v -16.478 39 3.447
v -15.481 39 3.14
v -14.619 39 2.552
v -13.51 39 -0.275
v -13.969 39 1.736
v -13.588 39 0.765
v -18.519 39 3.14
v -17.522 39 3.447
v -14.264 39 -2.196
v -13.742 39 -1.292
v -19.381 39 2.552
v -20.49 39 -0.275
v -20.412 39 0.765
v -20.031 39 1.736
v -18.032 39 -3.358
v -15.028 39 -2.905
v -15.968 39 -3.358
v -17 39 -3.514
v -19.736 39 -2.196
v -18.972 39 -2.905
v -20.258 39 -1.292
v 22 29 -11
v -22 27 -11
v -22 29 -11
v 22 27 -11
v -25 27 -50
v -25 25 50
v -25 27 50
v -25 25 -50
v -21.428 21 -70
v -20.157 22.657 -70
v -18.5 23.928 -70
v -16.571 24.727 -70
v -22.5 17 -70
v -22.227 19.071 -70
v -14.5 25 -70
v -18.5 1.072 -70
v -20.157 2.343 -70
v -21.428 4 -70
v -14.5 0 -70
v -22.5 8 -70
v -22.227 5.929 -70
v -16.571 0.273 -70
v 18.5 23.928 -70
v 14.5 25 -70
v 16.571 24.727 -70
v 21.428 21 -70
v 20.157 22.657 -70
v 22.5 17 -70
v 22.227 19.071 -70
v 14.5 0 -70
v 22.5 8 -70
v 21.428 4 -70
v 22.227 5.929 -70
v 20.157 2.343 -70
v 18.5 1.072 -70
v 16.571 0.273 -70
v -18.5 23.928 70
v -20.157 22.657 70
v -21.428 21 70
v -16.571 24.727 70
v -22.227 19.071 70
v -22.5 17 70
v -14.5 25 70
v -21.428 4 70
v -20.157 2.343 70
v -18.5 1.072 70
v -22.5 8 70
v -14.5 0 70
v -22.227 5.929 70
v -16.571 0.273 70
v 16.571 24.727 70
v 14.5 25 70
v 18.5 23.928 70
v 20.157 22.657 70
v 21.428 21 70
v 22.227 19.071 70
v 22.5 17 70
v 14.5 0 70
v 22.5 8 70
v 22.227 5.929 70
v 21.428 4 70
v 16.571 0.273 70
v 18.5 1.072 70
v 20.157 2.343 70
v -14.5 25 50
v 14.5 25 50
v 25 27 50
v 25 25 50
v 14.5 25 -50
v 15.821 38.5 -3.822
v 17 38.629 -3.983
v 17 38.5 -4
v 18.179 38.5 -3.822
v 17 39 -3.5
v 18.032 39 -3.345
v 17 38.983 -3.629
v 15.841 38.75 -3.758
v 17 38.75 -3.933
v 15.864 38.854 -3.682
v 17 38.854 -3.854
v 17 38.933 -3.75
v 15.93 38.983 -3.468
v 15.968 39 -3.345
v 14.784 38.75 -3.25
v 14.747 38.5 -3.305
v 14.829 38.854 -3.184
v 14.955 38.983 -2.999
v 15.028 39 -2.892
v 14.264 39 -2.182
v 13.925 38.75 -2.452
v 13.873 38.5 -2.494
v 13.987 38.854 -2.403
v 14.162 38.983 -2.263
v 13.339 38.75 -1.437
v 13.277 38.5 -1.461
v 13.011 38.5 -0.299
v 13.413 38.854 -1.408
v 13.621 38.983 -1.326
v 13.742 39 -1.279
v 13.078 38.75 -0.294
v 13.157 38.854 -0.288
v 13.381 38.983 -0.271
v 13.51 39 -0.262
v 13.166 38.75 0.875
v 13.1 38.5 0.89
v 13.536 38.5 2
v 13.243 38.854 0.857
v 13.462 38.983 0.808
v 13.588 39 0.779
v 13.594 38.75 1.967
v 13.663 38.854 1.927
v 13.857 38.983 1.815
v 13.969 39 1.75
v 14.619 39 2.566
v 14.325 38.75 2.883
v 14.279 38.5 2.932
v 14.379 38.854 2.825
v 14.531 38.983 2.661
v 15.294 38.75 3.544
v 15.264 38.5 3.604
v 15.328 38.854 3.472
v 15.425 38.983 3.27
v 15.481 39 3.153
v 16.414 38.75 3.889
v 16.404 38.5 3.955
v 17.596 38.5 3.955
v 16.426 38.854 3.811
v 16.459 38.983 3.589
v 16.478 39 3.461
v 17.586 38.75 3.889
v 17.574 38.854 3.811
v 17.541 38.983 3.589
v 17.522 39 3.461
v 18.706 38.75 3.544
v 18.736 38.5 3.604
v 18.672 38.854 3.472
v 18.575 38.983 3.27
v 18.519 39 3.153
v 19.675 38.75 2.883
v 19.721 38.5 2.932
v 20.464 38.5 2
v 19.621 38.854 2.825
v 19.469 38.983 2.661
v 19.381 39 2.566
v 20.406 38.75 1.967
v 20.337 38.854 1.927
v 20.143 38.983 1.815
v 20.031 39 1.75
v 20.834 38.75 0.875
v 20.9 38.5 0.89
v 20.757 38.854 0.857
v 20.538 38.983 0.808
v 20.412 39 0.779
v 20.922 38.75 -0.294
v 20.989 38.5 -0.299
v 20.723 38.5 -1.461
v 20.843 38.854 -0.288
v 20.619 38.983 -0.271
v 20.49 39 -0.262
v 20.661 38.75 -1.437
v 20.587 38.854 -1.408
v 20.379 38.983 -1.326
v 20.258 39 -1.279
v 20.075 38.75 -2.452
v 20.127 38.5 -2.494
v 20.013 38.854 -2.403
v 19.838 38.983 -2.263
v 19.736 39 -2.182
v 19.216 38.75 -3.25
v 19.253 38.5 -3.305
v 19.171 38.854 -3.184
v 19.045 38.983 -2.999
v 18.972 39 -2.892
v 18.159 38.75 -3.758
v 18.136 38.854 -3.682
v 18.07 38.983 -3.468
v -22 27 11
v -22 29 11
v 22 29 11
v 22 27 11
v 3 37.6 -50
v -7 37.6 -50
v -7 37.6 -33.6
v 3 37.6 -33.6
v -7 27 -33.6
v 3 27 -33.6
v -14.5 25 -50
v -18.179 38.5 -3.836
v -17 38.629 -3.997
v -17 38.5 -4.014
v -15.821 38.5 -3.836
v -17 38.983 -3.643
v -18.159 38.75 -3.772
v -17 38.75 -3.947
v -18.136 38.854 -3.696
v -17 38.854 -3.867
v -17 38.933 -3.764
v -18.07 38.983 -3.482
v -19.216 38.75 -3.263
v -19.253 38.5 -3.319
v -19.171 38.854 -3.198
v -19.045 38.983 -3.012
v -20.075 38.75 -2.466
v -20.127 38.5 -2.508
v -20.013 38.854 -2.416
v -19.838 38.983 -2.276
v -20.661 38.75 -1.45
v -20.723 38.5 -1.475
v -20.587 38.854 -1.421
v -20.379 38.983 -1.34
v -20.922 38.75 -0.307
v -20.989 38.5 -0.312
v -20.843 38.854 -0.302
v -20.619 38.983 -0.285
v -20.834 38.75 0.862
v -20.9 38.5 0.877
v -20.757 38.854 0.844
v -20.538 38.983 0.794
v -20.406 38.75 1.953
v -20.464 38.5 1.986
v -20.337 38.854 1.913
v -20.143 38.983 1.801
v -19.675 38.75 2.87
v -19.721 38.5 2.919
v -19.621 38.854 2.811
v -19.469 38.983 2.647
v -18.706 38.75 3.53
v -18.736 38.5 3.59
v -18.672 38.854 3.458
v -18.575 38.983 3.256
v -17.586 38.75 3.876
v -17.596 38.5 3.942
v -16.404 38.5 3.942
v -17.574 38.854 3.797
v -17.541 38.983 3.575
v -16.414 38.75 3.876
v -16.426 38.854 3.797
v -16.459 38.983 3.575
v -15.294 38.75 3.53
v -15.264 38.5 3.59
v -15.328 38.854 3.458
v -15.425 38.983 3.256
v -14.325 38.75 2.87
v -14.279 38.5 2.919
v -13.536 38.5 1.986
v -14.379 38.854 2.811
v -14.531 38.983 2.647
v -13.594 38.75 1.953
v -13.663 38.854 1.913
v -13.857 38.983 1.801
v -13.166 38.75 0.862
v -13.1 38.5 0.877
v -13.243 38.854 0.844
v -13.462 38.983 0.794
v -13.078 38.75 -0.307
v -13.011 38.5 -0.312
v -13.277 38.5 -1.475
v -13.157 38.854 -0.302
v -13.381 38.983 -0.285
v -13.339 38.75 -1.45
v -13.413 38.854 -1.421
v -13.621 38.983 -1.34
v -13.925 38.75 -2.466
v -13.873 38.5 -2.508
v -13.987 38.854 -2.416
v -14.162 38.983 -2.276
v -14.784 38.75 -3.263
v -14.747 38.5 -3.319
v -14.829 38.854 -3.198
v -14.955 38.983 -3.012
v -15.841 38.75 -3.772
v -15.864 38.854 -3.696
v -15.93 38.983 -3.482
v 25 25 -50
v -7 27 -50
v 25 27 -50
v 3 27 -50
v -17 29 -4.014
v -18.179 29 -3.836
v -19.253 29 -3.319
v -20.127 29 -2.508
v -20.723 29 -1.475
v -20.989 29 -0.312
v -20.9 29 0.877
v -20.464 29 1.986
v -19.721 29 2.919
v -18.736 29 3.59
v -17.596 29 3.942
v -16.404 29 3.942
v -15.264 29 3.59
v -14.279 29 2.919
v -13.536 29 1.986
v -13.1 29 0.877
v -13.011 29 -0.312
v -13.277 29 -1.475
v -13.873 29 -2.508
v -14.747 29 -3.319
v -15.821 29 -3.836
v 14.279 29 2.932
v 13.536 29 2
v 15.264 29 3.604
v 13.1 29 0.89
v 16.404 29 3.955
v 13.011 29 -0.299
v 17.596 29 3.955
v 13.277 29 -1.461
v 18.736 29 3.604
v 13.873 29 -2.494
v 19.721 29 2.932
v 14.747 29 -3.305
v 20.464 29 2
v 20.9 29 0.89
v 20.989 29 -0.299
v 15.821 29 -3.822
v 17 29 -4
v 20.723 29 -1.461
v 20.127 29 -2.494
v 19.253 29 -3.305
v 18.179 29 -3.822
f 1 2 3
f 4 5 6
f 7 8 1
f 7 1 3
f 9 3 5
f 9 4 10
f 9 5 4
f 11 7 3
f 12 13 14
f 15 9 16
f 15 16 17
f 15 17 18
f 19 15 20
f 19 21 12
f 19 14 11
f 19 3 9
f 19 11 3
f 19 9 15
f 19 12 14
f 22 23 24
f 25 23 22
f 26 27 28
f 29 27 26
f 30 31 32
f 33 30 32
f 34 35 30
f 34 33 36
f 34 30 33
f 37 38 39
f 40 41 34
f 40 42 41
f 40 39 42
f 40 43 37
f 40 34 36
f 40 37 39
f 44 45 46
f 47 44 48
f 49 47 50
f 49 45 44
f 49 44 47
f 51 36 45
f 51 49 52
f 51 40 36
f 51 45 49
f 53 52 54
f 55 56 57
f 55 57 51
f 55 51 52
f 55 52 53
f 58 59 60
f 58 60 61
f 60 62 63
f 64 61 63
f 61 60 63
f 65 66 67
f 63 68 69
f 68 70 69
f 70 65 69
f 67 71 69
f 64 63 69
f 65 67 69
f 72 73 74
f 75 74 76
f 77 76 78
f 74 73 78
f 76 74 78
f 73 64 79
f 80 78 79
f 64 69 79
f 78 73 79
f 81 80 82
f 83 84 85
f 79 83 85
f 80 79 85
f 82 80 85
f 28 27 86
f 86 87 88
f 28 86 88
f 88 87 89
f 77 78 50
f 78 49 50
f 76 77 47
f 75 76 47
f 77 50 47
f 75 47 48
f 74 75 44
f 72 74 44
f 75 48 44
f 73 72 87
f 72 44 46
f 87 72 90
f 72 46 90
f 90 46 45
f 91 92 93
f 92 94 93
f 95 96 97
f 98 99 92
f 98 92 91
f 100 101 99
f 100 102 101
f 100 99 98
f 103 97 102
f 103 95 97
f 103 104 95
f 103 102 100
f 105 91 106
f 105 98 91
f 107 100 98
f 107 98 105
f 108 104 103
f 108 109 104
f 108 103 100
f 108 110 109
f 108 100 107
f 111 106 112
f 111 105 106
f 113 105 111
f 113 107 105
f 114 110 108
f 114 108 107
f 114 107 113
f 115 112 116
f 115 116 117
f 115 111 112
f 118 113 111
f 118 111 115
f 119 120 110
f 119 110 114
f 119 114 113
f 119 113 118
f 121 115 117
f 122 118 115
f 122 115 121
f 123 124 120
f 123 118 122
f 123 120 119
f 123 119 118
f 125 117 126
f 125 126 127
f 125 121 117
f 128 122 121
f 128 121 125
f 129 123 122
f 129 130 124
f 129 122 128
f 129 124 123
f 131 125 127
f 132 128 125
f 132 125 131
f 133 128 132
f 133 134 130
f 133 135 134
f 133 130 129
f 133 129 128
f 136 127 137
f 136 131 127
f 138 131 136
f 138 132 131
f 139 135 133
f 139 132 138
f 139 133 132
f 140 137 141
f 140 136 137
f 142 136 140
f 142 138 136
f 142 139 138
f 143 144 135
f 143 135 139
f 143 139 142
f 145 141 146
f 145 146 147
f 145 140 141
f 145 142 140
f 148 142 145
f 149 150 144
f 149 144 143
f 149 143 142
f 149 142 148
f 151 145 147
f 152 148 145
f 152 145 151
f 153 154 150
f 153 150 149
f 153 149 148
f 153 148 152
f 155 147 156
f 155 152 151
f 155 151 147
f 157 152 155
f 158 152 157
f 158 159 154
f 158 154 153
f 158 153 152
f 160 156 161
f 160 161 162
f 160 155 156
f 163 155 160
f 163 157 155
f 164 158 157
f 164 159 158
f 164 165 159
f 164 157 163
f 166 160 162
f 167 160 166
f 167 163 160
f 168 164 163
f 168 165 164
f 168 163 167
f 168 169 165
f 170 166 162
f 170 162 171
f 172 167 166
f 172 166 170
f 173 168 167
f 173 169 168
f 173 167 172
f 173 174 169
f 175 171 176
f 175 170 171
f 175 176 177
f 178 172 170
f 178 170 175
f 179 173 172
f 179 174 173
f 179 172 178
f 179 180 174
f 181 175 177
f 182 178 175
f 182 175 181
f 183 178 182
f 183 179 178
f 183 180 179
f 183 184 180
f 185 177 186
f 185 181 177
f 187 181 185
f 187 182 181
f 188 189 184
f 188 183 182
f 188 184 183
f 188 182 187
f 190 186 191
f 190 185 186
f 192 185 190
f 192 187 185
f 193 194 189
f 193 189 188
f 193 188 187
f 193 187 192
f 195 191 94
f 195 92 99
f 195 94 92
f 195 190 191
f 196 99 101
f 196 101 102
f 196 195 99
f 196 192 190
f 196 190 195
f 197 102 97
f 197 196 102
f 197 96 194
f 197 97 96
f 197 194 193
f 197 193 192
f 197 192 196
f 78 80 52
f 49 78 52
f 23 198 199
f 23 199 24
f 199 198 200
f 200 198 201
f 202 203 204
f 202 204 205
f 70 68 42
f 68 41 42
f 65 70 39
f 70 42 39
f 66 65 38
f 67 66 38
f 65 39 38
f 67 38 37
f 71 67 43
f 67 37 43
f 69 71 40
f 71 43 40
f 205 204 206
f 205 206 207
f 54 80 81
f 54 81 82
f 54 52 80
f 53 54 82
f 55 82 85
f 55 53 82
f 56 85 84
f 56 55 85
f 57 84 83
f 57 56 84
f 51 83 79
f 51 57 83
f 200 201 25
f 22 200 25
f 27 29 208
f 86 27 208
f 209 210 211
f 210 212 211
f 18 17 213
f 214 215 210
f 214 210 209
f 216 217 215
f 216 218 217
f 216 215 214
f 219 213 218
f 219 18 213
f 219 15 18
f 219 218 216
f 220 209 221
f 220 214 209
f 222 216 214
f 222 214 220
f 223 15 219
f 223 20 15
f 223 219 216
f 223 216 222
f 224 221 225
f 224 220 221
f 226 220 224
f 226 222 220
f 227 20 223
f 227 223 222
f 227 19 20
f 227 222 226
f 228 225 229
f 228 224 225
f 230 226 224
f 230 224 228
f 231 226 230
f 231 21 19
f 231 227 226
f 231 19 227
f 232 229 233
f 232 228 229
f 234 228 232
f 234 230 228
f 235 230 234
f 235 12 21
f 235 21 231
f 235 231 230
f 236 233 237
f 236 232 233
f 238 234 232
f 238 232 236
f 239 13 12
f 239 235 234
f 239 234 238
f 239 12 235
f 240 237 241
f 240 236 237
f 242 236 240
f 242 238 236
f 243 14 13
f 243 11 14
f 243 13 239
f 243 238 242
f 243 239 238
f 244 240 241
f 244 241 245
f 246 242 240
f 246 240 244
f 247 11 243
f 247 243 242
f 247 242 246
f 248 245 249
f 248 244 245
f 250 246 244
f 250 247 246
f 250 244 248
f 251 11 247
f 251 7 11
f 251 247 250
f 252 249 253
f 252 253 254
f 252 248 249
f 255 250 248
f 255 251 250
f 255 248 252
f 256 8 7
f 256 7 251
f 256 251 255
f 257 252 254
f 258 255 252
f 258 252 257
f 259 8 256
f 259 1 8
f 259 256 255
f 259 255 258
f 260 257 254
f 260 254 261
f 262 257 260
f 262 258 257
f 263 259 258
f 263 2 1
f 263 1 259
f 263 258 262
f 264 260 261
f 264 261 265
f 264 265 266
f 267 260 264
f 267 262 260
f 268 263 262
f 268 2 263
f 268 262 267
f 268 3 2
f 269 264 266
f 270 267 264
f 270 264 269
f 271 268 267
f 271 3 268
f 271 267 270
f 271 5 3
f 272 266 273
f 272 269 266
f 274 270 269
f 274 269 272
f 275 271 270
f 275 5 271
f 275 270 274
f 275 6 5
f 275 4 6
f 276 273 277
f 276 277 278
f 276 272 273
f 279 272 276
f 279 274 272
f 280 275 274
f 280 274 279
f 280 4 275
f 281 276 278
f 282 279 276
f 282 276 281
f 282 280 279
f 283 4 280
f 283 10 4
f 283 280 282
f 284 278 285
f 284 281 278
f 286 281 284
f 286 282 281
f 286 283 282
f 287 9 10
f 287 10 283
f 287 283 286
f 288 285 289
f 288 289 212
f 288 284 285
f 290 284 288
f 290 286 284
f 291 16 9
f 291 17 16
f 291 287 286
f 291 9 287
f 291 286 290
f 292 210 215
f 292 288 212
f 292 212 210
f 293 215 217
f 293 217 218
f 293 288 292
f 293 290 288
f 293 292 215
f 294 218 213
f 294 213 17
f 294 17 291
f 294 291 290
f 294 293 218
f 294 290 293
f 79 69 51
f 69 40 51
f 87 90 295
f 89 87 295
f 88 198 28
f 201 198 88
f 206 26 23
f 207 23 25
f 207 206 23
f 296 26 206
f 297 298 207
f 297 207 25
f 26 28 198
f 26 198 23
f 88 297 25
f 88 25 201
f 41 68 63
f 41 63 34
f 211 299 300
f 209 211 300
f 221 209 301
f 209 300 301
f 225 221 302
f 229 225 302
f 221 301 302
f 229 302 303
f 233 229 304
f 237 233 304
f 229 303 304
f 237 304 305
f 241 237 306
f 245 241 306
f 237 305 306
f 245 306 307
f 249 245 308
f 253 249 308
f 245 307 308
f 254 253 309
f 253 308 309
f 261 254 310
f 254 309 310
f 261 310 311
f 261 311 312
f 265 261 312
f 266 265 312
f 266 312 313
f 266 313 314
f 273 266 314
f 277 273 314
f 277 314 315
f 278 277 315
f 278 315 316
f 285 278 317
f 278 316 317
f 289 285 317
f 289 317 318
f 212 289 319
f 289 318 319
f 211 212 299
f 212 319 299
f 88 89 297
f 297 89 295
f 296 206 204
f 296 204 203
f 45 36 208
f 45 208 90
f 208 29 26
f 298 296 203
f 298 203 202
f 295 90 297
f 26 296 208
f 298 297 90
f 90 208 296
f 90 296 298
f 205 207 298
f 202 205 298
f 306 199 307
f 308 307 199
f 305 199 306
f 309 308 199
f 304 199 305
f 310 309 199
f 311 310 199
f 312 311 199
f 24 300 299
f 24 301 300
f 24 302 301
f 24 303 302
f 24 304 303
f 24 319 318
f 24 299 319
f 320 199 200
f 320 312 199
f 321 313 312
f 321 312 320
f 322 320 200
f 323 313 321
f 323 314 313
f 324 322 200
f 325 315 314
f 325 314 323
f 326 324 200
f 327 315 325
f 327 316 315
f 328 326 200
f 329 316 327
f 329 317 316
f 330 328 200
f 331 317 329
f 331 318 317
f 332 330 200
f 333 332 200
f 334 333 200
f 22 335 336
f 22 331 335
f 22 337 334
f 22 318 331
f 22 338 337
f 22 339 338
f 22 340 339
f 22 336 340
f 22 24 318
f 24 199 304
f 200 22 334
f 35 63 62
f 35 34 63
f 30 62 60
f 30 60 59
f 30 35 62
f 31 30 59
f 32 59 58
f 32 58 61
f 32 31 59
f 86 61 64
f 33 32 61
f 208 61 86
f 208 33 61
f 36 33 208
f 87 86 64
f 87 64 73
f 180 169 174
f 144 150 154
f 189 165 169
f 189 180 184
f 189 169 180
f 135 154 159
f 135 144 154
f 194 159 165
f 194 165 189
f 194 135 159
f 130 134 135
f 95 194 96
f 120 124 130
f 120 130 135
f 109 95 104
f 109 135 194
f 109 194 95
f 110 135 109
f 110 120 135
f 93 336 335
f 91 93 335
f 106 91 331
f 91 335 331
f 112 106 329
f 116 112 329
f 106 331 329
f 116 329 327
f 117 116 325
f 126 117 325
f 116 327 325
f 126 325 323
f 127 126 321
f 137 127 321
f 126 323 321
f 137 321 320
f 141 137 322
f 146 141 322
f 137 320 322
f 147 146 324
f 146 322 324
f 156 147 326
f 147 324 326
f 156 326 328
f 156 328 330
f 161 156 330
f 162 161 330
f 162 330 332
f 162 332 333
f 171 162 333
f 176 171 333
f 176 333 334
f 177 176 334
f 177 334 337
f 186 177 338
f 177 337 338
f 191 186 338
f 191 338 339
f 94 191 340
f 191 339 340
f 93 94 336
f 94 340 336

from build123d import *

# Parameters (mm, degrees)
SKIZZE1_W                       = 45
SKIZZE1_H                       = 140
AUFSATZ_LINEAR_AUSTRAGEN1_DEPTH = 25
VERRUNDUNG1_R                   = 8
SKIZZE2_W                       = 50
SKIZZE2_H                       = 100
AUFSATZ_LINEAR_AUSTRAGEN2_DEPTH = 2
SKIZZE4_W                       = 10
SKIZZE4_H                       = 16.4
AUFSATZ_LINEAR_AUSTRAGEN3_DEPTH = 10.6
SKIZZE5_W                       = 44
SKIZZE5_H                       = 22
AUFSATZ_LINEAR_AUSTRAGEN4_DEPTH = 2
SKIZZE6_R                       = 4
AUFSATZ_LINEAR_AUSTRAGEN5_DEPTH = 10
VERRUNDUNG2_R                   = 0.5


with BuildPart() as part:
    # Skizze1 → Aufsatz-Linear austragen1 (new body)
    with BuildSketch(Plane(origin=(0, 0, 0), x_dir=(1, 0, 0), z_dir=(0, 1, 0))):
        Rectangle(SKIZZE1_W, SKIZZE1_H)
    extrude(amount=AUFSATZ_LINEAR_AUSTRAGEN1_DEPTH)

    # Verrundung1
    verrundung1_edges = [part.edges().sort_by_distance(p)[0] for p in [
        (-22.5, 25, 0),
        (22.5, 25, 0),
        (-22.5, 0, 0),
        (22.5, 0, 0),
    ]]
    fillet(verrundung1_edges, radius=VERRUNDUNG1_R)

    # Skizze2 → Aufsatz-Linear austragen2 (add)
    with BuildSketch(Plane(origin=(0, 25, 0), x_dir=(1, 0, 0), z_dir=(0, 1, 0))):
        Rectangle(SKIZZE2_W, SKIZZE2_H)
    extrude(amount=AUFSATZ_LINEAR_AUSTRAGEN2_DEPTH)

    # Skizze4 → Aufsatz-Linear austragen3 (add)
    with BuildSketch(Plane(origin=(0, 27, 0), x_dir=(1, 0, 0), z_dir=(0, 1, 0))):
        with Locations((-2, 41.8)):
            Rectangle(SKIZZE4_W, SKIZZE4_H)
    extrude(amount=AUFSATZ_LINEAR_AUSTRAGEN3_DEPTH)



with BuildPart() as body_2:
    # Skizze5 → Aufsatz-Linear austragen4 (new body)
    with BuildSketch(Plane(origin=(0, 27, 0), x_dir=(1, 0, 0), z_dir=(0, 1, 0))):
        Rectangle(SKIZZE5_W, SKIZZE5_H)
    extrude(amount=AUFSATZ_LINEAR_AUSTRAGEN4_DEPTH)


with BuildPart() as part_1:
    add(part.part)

    add(body_2.part)  # Aufsatz-Linear austragen5 merges body 2
    # Skizze6 → Aufsatz-Linear austragen5 (add)
    with BuildSketch(Plane(origin=(0, 29, 0), x_dir=(1, 0, 0), z_dir=(0, 1, 0))):
        with Locations(Location((17, 0, 0), (0, 0, 90))):
            Circle(SKIZZE6_R)
        with Locations(Location((-17, 0.013570227, 0), (0, 0, 90))):
            Circle(SKIZZE6_R)
    extrude(amount=AUFSATZ_LINEAR_AUSTRAGEN5_DEPTH)

    # Verrundung2
    verrundung2_edges = [part_1.edges().sort_by_distance(p)[0] for p in [
        (17, 39, 4),
        (-17, 39, 3.986429773),
    ]]
    fillet(verrundung2_edges, radius=VERRUNDUNG2_R)


solid = part_1.part
